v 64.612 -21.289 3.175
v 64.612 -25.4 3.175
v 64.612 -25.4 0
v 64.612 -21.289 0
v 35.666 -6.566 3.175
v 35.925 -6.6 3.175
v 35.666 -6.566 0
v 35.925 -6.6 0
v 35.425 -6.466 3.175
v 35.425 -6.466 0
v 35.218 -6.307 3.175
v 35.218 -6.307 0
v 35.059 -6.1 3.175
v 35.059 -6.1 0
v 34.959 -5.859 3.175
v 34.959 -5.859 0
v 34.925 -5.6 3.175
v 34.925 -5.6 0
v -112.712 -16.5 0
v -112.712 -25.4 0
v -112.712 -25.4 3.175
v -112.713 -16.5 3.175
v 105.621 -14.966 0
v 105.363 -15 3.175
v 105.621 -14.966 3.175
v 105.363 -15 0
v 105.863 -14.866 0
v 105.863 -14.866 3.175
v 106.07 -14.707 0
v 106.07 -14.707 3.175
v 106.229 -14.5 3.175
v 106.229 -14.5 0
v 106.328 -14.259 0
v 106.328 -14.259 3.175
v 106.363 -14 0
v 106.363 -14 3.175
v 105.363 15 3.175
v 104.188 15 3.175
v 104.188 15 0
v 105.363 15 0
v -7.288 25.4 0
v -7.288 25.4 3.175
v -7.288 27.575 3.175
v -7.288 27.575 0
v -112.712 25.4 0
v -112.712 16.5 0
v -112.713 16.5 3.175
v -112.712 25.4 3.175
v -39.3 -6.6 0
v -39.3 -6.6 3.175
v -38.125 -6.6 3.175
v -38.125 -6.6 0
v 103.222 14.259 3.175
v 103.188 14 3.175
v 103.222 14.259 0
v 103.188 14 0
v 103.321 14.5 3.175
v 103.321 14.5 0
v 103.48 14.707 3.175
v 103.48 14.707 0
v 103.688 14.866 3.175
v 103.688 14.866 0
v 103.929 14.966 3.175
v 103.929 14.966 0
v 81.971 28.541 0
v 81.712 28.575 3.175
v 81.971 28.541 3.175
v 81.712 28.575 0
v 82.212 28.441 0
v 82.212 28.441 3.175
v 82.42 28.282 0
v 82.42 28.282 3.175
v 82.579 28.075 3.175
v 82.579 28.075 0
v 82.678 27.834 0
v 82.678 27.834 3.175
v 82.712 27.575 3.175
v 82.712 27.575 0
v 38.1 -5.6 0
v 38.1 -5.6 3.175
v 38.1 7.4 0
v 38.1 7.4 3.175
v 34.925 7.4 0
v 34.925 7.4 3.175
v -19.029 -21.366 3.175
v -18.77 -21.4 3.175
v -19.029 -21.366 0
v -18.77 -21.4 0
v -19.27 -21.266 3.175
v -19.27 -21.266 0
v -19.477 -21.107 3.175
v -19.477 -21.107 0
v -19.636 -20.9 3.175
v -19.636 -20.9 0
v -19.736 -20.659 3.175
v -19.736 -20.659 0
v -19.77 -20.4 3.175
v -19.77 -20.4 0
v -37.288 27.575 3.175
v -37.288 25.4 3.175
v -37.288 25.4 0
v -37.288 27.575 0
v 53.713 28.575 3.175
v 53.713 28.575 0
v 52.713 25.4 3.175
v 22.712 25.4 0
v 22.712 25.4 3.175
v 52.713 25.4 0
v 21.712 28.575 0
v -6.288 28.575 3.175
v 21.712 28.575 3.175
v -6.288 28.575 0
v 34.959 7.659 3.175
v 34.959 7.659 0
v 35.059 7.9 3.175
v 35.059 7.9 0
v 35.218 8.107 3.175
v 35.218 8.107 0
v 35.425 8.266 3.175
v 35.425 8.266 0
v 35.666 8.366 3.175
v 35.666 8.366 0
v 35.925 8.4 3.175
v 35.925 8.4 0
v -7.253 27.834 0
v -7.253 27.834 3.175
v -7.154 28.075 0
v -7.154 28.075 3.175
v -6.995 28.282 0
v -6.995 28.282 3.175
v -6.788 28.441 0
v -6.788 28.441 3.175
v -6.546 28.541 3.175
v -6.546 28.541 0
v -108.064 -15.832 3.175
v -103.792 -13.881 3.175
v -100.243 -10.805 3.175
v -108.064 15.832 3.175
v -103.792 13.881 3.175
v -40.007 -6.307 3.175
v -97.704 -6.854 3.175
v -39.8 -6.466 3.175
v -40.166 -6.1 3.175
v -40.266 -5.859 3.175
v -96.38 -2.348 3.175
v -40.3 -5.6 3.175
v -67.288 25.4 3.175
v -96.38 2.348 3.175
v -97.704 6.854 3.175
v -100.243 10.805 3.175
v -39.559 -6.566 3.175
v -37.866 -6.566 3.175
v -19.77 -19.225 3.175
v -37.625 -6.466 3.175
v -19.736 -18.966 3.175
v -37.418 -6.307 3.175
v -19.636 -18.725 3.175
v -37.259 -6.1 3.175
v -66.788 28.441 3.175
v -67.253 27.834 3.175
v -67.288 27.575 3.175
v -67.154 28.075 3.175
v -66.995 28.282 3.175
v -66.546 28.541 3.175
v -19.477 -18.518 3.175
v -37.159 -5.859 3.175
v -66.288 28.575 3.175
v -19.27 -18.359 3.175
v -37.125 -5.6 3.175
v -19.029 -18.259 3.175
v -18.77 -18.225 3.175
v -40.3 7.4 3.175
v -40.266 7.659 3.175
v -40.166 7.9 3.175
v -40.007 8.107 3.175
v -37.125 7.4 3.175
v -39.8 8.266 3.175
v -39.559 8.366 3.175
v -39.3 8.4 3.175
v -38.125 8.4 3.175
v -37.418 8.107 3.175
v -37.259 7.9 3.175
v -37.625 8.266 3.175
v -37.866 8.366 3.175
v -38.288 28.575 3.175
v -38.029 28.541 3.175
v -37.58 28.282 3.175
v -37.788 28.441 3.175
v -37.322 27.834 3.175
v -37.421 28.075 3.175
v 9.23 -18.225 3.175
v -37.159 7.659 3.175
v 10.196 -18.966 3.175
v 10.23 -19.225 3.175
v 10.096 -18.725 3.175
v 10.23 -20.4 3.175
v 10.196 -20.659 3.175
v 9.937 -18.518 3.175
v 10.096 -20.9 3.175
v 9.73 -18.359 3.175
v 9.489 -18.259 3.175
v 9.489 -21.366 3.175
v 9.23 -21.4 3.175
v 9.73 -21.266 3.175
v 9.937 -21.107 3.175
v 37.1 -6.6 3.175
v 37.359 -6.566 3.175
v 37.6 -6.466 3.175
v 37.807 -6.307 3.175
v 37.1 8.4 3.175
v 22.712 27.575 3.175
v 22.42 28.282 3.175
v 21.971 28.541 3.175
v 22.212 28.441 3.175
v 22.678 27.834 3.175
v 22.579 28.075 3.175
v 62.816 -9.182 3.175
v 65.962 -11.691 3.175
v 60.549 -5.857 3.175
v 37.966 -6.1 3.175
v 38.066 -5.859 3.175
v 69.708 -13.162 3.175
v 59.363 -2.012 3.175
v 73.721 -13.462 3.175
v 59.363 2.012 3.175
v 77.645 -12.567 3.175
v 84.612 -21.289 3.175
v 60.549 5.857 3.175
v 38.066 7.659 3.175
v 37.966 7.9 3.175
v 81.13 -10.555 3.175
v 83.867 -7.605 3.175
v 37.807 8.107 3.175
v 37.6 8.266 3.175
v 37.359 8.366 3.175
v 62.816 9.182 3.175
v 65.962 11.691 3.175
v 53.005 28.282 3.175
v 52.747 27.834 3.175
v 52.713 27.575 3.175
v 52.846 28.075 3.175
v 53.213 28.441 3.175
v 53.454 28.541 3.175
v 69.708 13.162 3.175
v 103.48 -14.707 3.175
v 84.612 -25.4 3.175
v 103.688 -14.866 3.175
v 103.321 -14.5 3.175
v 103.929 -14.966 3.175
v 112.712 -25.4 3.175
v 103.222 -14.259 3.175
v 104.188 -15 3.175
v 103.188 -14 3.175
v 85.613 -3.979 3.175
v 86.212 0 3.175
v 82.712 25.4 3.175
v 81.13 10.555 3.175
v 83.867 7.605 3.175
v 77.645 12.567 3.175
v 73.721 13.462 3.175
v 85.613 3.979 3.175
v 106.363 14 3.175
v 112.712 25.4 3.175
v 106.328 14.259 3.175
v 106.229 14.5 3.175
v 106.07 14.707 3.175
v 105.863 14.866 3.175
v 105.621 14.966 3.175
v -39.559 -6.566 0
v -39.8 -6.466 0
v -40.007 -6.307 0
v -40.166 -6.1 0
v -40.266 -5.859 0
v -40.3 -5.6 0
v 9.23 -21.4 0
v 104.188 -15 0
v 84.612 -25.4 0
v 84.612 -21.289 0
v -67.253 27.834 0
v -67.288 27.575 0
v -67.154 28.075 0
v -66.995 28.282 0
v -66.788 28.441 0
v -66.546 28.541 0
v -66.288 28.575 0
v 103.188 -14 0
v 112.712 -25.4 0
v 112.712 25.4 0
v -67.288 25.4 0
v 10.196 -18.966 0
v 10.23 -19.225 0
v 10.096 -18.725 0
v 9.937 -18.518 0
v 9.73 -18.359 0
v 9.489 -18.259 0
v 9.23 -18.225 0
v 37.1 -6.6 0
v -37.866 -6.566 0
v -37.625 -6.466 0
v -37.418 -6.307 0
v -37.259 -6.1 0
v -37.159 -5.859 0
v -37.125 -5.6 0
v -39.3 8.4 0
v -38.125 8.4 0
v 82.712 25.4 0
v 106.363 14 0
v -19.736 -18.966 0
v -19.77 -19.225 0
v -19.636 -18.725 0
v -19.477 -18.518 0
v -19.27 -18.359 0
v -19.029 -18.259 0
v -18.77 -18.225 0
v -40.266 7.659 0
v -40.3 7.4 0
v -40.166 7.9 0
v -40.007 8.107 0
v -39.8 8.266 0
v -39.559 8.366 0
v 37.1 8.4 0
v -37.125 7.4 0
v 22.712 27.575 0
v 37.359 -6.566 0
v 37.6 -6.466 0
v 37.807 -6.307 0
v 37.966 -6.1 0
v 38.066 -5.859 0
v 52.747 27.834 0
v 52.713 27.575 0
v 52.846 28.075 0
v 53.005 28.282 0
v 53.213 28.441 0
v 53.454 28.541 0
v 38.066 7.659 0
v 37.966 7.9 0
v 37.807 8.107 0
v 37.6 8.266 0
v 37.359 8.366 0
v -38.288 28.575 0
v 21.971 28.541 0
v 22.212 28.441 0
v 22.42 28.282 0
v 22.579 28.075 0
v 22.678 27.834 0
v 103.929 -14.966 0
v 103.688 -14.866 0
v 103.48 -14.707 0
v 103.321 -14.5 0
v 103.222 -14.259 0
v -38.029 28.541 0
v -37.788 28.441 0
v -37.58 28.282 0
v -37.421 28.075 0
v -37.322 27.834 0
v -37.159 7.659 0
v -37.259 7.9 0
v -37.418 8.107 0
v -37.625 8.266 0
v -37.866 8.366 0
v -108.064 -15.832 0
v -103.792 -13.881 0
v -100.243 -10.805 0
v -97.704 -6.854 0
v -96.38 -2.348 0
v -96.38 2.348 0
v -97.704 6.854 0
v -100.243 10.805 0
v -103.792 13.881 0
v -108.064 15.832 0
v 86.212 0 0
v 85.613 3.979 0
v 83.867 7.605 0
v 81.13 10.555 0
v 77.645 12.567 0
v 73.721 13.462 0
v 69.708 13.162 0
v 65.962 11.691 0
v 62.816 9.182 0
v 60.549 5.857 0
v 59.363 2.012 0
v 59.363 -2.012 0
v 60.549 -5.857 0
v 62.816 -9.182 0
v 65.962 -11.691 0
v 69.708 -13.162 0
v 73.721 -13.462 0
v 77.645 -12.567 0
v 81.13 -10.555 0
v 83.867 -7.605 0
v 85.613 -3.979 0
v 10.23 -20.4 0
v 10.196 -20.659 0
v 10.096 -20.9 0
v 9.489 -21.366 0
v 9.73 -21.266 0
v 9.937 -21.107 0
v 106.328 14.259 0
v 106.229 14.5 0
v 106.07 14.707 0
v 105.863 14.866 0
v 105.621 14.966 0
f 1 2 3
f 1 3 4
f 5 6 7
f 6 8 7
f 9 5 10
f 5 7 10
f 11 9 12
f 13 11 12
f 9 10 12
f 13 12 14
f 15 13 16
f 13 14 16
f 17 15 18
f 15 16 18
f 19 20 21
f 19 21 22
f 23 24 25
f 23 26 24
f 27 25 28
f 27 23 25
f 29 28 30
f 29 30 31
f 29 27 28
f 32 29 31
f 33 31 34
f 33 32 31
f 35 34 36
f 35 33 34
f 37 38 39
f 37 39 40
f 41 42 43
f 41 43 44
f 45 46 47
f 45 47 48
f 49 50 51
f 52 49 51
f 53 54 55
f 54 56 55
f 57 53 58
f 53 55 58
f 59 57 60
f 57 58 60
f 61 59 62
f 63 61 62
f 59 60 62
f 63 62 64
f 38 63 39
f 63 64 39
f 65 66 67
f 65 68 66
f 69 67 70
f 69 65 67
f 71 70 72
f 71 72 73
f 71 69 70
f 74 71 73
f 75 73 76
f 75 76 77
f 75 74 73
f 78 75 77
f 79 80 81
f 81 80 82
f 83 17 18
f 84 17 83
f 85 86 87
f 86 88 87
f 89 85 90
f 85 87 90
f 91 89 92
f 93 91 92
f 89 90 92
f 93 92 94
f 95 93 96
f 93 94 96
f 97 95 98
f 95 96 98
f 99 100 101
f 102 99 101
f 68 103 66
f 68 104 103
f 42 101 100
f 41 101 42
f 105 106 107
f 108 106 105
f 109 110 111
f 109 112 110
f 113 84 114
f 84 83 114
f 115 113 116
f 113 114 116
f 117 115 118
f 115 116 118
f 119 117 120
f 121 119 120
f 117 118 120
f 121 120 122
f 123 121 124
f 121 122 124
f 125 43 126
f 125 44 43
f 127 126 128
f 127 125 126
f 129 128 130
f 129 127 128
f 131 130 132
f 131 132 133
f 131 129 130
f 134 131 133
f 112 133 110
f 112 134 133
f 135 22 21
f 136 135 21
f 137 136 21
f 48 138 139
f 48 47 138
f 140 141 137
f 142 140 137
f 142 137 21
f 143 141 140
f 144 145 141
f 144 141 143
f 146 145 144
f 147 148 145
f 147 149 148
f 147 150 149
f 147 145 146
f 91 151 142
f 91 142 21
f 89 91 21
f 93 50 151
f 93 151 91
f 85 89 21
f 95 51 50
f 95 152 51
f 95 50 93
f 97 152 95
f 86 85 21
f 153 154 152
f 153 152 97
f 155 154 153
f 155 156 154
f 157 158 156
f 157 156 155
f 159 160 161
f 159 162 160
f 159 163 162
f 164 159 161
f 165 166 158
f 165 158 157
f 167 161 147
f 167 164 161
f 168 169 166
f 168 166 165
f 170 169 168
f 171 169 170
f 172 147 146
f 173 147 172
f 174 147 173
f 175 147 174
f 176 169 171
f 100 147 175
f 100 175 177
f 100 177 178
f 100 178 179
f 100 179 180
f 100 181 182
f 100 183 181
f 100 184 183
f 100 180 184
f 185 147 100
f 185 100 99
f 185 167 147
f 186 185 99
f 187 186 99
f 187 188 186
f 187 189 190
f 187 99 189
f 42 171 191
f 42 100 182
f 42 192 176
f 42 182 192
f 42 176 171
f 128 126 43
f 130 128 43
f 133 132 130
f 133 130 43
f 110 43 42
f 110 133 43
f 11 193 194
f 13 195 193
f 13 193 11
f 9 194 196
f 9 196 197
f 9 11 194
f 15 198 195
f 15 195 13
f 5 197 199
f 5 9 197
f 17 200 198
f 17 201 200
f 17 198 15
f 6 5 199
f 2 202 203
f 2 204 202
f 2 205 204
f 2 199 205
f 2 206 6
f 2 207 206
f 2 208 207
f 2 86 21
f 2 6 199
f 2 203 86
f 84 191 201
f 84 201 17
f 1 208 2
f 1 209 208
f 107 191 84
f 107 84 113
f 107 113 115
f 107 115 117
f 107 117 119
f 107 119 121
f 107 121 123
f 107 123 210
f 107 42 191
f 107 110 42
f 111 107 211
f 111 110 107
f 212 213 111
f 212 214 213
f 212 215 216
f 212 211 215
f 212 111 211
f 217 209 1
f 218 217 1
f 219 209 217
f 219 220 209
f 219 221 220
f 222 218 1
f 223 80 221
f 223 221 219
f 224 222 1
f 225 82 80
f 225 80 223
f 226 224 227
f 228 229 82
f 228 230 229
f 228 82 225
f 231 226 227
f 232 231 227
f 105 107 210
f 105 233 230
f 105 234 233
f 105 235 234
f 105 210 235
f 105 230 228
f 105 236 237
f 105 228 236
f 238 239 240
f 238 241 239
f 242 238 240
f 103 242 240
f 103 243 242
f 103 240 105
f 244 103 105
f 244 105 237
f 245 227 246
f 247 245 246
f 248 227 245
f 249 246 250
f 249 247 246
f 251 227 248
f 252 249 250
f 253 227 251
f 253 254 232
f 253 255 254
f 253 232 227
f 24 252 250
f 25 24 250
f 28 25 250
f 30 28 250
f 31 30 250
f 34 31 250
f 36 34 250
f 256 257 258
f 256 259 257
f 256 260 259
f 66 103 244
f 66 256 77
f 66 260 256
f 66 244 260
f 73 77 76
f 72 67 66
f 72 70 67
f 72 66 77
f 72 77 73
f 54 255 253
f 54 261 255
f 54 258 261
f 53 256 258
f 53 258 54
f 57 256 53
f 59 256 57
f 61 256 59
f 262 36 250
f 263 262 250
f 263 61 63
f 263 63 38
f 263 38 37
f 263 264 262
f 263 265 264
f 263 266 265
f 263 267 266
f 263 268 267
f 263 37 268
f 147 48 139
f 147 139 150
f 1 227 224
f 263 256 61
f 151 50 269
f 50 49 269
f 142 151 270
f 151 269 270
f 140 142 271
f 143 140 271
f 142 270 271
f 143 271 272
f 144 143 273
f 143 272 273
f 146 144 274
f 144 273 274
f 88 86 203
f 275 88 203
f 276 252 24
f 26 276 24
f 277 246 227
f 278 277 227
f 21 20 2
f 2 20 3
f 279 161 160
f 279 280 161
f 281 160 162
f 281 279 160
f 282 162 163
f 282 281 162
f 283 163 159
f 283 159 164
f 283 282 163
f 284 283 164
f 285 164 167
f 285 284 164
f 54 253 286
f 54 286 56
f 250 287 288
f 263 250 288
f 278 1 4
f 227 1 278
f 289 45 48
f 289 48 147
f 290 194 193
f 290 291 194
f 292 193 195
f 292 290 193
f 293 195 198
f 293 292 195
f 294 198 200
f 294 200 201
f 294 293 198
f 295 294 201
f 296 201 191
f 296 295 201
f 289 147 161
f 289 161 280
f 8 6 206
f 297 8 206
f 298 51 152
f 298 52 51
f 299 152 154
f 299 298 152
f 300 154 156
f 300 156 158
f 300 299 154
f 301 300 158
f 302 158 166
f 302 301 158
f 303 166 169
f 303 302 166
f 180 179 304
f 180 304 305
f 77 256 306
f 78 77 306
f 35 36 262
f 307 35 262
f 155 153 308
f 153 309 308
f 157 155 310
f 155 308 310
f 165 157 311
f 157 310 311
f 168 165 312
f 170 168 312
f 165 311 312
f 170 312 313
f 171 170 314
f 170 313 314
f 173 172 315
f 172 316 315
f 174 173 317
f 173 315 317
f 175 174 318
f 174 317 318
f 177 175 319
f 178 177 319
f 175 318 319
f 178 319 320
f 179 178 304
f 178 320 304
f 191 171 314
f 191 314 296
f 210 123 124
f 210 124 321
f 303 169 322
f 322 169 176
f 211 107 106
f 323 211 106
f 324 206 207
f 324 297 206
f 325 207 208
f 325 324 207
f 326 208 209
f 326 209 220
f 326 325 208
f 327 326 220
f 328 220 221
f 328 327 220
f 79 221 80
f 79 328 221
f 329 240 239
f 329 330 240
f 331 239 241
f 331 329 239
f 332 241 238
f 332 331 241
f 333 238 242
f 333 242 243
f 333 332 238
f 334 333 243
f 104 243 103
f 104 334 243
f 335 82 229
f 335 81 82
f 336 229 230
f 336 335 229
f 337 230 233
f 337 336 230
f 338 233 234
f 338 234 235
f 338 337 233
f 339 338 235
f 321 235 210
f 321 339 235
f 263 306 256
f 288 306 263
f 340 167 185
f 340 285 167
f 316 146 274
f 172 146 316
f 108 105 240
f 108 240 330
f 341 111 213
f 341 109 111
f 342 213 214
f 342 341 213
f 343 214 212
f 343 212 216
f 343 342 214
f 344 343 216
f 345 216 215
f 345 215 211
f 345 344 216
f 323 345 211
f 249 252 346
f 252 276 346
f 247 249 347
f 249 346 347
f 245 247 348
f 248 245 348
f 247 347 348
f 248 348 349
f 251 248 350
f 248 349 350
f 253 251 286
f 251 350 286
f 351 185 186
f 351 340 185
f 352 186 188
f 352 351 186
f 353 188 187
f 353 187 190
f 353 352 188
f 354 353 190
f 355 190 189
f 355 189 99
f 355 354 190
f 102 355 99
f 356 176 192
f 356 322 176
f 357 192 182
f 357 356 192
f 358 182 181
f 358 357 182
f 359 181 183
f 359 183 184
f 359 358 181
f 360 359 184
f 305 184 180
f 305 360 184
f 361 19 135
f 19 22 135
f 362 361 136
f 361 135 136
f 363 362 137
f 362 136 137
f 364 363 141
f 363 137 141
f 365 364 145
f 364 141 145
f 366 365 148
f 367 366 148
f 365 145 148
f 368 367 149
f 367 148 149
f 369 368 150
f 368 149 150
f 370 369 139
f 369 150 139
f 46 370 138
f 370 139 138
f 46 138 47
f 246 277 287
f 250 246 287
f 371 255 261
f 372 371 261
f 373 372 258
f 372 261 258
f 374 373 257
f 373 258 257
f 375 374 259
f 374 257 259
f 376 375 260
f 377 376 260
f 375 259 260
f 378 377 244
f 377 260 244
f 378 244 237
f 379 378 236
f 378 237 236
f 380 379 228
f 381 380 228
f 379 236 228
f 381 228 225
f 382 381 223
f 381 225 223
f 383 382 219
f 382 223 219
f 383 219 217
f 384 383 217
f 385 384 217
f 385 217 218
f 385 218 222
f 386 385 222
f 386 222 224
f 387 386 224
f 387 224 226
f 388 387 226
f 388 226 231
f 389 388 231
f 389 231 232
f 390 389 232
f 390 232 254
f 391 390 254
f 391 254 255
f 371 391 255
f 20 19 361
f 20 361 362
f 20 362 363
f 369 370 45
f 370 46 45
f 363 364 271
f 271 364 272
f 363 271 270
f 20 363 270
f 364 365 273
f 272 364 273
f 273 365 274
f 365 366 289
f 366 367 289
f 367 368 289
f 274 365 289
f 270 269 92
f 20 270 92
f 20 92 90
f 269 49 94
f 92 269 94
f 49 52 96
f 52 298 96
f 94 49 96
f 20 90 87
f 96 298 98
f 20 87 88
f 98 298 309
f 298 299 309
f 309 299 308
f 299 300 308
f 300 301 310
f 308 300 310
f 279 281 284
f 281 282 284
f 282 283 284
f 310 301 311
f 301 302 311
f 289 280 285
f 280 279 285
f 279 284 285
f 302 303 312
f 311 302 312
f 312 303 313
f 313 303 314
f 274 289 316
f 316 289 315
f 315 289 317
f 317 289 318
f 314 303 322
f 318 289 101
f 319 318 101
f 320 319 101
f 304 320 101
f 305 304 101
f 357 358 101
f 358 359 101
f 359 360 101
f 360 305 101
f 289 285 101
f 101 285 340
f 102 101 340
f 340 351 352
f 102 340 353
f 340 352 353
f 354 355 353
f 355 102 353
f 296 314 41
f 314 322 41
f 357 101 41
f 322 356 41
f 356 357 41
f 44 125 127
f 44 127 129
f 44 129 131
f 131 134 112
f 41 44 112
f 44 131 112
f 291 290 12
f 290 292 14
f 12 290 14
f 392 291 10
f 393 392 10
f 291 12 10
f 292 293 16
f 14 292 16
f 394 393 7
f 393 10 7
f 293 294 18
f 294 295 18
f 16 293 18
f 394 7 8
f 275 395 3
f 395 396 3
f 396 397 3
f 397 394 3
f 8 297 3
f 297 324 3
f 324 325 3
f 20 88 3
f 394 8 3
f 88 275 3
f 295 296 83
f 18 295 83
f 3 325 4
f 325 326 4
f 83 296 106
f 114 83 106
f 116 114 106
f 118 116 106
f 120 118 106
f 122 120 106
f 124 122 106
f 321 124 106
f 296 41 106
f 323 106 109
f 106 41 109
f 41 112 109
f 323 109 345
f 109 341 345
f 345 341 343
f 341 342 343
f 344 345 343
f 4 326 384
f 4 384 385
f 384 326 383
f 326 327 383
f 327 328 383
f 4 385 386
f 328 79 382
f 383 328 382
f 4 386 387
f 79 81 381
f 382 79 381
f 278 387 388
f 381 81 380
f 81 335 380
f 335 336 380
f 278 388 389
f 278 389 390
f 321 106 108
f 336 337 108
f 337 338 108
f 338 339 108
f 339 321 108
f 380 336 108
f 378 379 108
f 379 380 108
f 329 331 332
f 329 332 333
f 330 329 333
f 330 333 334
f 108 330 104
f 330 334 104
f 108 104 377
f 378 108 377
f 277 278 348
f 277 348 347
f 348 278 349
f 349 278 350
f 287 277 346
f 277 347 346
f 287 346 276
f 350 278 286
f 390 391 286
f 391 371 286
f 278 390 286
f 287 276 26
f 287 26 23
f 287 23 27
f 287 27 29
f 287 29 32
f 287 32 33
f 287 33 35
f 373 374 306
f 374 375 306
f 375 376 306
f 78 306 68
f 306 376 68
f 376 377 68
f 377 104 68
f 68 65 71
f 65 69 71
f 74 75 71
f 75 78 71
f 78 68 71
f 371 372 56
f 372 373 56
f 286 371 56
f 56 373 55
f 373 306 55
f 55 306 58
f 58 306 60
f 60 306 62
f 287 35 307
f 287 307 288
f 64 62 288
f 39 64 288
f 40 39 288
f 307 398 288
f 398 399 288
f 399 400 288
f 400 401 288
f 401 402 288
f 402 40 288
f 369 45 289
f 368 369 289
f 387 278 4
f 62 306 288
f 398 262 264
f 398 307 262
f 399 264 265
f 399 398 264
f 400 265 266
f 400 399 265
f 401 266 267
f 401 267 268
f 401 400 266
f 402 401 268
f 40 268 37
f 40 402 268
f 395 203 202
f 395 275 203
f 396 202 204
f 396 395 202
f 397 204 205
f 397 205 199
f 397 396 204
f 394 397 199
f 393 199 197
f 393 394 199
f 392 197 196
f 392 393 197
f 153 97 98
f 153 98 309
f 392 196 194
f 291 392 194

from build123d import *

# Parameters (mm, degrees)
SKETCH1_W           = 225.425
SKETCH1_H           = 50.8
BOSS_EXTRUDE1_DEPTH = 3.175
SKETCH2_W           = 30
SKETCH2_H           = 3.175
BOSS_EXTRUDE2_DEPTH = 3.175
SKETCH3_R           = 13.5
SKETCH3_R_2         = 16.5
CUT_EXTRUDE1_DEPTH  = 4.175
SKETCH4_W           = 3.175
SKETCH4_H           = 30
CUT_EXTRUDE2_DEPTH  = 10
SKETCH5_W           = 30
SKETCH5_H           = 3.175
CUT_EXTRUDE3_DEPTH  = 4.175
SKETCH6_W           = 3.175
SKETCH6_H           = 15
CUT_EXTRUDE4_DEPTH  = 4.175
SKETCH7_W           = 20
SKETCH7_H           = 4.111240443
CUT_EXTRUDE5_DEPTH  = 4.175
FILLET1_R           = 1


with BuildPart() as part:
    # Sketch1 → Boss-Extrude1 (new body)
    with BuildSketch(Plane.XY):
        Rectangle(SKETCH1_W, SKETCH1_H)
    extrude(amount=BOSS_EXTRUDE1_DEPTH)

    # Sketch2 → Boss-Extrude2 (add)
    with BuildSketch(Plane(origin=(0, 25.4, 0), x_dir=(1, 0, 0), z_dir=(0, 1, 0))):
        with Locations((67.7125, -1.5875)):
            Rectangle(SKETCH2_W, SKETCH2_H)
        with Locations((7.7125, -1.5875)):
            Rectangle(SKETCH2_W, SKETCH2_H)
        with Locations((-52.2875, -1.5875)):
            Rectangle(SKETCH2_W, SKETCH2_H)
    extrude(amount=BOSS_EXTRUDE2_DEPTH)

    # Sketch3 → Cut-Extrude1 (cut, through all)
    with BuildSketch(Plane.XY.offset(3.175)):
        with Locations((72.7125, 0)):
            Circle(SKETCH3_R)
        with Locations((-112.7125, 0)):
            Circle(SKETCH3_R_2)
    extrude(amount=-CUT_EXTRUDE1_DEPTH, mode=Mode.SUBTRACT)

    # Sketch4 → Cut-Extrude2 (cut)
    with BuildSketch(Plane.XY.offset(3.175)):
        with Locations((104.775, 0)):
            Rectangle(SKETCH4_W, SKETCH4_H)
    extrude(amount=-CUT_EXTRUDE2_DEPTH, mode=Mode.SUBTRACT)

    # Sketch5 → Cut-Extrude3 (cut, through all)
    with BuildSketch(Plane.XY.offset(3.175)):
        with Locations((-4.77, -19.8125)):
            Rectangle(SKETCH5_W, SKETCH5_H)
    extrude(amount=-CUT_EXTRUDE3_DEPTH, mode=Mode.SUBTRACT)

    # Sketch6 → Cut-Extrude4 (cut, through all)
    with BuildSketch(Plane.XY.offset(3.175)):
        with Locations((-38.7125, 0.9)):
            Rectangle(SKETCH6_W, SKETCH6_H)
        with Locations((36.5125, 0.9)):
            Rectangle(SKETCH6_W, SKETCH6_H)
    extrude(amount=-CUT_EXTRUDE4_DEPTH, mode=Mode.SUBTRACT)

    # Sketch7 → Cut-Extrude5 (cut, through all)
    with BuildSketch(Plane.XY.offset(3.175)):
        with Locations((74.6125, -23.344379779)):
            Rectangle(SKETCH7_W, SKETCH7_H)
    extrude(amount=-CUT_EXTRUDE5_DEPTH, mode=Mode.SUBTRACT)

    # Fillet1
    fillet1_edges = [part.edges().sort_by_distance(p)[0] for p in [
        (10.23, -18.225, 1.5875),
        (10.23, -21.4, 1.5875),
        (-19.77, -21.4, 1.5875),
        (-19.77, -18.225, 1.5875),
        (-37.125, 8.4, 1.5875),
        (-37.125, -6.6, 1.5875),
        (-40.3, -6.6, 1.5875),
        (-40.3, 8.4, 1.5875),
        (34.925, -6.6, 1.5875),
        (34.925, 8.4, 1.5875),
        (38.1, 8.4, 1.5875),
        (38.1, -6.6, 1.5875),
        (82.7125, 28.575, 1.5875),
        (52.7125, 28.575, 1.5875),
        (-7.2875, 28.575, 1.5875),
        (22.7125, 28.575, 1.5875),
        (-67.2875, 28.575, 1.5875),
        (-37.2875, 28.575, 1.5875),
        (103.1875, -15, 1.5875),
        (103.1875, 15, 1.5875),
        (106.3625, 15, 1.5875),
        (106.3625, -15, 1.5875),
    ]]
    fillet(fillet1_edges, radius=FILLET1_R)


solid = part.part
